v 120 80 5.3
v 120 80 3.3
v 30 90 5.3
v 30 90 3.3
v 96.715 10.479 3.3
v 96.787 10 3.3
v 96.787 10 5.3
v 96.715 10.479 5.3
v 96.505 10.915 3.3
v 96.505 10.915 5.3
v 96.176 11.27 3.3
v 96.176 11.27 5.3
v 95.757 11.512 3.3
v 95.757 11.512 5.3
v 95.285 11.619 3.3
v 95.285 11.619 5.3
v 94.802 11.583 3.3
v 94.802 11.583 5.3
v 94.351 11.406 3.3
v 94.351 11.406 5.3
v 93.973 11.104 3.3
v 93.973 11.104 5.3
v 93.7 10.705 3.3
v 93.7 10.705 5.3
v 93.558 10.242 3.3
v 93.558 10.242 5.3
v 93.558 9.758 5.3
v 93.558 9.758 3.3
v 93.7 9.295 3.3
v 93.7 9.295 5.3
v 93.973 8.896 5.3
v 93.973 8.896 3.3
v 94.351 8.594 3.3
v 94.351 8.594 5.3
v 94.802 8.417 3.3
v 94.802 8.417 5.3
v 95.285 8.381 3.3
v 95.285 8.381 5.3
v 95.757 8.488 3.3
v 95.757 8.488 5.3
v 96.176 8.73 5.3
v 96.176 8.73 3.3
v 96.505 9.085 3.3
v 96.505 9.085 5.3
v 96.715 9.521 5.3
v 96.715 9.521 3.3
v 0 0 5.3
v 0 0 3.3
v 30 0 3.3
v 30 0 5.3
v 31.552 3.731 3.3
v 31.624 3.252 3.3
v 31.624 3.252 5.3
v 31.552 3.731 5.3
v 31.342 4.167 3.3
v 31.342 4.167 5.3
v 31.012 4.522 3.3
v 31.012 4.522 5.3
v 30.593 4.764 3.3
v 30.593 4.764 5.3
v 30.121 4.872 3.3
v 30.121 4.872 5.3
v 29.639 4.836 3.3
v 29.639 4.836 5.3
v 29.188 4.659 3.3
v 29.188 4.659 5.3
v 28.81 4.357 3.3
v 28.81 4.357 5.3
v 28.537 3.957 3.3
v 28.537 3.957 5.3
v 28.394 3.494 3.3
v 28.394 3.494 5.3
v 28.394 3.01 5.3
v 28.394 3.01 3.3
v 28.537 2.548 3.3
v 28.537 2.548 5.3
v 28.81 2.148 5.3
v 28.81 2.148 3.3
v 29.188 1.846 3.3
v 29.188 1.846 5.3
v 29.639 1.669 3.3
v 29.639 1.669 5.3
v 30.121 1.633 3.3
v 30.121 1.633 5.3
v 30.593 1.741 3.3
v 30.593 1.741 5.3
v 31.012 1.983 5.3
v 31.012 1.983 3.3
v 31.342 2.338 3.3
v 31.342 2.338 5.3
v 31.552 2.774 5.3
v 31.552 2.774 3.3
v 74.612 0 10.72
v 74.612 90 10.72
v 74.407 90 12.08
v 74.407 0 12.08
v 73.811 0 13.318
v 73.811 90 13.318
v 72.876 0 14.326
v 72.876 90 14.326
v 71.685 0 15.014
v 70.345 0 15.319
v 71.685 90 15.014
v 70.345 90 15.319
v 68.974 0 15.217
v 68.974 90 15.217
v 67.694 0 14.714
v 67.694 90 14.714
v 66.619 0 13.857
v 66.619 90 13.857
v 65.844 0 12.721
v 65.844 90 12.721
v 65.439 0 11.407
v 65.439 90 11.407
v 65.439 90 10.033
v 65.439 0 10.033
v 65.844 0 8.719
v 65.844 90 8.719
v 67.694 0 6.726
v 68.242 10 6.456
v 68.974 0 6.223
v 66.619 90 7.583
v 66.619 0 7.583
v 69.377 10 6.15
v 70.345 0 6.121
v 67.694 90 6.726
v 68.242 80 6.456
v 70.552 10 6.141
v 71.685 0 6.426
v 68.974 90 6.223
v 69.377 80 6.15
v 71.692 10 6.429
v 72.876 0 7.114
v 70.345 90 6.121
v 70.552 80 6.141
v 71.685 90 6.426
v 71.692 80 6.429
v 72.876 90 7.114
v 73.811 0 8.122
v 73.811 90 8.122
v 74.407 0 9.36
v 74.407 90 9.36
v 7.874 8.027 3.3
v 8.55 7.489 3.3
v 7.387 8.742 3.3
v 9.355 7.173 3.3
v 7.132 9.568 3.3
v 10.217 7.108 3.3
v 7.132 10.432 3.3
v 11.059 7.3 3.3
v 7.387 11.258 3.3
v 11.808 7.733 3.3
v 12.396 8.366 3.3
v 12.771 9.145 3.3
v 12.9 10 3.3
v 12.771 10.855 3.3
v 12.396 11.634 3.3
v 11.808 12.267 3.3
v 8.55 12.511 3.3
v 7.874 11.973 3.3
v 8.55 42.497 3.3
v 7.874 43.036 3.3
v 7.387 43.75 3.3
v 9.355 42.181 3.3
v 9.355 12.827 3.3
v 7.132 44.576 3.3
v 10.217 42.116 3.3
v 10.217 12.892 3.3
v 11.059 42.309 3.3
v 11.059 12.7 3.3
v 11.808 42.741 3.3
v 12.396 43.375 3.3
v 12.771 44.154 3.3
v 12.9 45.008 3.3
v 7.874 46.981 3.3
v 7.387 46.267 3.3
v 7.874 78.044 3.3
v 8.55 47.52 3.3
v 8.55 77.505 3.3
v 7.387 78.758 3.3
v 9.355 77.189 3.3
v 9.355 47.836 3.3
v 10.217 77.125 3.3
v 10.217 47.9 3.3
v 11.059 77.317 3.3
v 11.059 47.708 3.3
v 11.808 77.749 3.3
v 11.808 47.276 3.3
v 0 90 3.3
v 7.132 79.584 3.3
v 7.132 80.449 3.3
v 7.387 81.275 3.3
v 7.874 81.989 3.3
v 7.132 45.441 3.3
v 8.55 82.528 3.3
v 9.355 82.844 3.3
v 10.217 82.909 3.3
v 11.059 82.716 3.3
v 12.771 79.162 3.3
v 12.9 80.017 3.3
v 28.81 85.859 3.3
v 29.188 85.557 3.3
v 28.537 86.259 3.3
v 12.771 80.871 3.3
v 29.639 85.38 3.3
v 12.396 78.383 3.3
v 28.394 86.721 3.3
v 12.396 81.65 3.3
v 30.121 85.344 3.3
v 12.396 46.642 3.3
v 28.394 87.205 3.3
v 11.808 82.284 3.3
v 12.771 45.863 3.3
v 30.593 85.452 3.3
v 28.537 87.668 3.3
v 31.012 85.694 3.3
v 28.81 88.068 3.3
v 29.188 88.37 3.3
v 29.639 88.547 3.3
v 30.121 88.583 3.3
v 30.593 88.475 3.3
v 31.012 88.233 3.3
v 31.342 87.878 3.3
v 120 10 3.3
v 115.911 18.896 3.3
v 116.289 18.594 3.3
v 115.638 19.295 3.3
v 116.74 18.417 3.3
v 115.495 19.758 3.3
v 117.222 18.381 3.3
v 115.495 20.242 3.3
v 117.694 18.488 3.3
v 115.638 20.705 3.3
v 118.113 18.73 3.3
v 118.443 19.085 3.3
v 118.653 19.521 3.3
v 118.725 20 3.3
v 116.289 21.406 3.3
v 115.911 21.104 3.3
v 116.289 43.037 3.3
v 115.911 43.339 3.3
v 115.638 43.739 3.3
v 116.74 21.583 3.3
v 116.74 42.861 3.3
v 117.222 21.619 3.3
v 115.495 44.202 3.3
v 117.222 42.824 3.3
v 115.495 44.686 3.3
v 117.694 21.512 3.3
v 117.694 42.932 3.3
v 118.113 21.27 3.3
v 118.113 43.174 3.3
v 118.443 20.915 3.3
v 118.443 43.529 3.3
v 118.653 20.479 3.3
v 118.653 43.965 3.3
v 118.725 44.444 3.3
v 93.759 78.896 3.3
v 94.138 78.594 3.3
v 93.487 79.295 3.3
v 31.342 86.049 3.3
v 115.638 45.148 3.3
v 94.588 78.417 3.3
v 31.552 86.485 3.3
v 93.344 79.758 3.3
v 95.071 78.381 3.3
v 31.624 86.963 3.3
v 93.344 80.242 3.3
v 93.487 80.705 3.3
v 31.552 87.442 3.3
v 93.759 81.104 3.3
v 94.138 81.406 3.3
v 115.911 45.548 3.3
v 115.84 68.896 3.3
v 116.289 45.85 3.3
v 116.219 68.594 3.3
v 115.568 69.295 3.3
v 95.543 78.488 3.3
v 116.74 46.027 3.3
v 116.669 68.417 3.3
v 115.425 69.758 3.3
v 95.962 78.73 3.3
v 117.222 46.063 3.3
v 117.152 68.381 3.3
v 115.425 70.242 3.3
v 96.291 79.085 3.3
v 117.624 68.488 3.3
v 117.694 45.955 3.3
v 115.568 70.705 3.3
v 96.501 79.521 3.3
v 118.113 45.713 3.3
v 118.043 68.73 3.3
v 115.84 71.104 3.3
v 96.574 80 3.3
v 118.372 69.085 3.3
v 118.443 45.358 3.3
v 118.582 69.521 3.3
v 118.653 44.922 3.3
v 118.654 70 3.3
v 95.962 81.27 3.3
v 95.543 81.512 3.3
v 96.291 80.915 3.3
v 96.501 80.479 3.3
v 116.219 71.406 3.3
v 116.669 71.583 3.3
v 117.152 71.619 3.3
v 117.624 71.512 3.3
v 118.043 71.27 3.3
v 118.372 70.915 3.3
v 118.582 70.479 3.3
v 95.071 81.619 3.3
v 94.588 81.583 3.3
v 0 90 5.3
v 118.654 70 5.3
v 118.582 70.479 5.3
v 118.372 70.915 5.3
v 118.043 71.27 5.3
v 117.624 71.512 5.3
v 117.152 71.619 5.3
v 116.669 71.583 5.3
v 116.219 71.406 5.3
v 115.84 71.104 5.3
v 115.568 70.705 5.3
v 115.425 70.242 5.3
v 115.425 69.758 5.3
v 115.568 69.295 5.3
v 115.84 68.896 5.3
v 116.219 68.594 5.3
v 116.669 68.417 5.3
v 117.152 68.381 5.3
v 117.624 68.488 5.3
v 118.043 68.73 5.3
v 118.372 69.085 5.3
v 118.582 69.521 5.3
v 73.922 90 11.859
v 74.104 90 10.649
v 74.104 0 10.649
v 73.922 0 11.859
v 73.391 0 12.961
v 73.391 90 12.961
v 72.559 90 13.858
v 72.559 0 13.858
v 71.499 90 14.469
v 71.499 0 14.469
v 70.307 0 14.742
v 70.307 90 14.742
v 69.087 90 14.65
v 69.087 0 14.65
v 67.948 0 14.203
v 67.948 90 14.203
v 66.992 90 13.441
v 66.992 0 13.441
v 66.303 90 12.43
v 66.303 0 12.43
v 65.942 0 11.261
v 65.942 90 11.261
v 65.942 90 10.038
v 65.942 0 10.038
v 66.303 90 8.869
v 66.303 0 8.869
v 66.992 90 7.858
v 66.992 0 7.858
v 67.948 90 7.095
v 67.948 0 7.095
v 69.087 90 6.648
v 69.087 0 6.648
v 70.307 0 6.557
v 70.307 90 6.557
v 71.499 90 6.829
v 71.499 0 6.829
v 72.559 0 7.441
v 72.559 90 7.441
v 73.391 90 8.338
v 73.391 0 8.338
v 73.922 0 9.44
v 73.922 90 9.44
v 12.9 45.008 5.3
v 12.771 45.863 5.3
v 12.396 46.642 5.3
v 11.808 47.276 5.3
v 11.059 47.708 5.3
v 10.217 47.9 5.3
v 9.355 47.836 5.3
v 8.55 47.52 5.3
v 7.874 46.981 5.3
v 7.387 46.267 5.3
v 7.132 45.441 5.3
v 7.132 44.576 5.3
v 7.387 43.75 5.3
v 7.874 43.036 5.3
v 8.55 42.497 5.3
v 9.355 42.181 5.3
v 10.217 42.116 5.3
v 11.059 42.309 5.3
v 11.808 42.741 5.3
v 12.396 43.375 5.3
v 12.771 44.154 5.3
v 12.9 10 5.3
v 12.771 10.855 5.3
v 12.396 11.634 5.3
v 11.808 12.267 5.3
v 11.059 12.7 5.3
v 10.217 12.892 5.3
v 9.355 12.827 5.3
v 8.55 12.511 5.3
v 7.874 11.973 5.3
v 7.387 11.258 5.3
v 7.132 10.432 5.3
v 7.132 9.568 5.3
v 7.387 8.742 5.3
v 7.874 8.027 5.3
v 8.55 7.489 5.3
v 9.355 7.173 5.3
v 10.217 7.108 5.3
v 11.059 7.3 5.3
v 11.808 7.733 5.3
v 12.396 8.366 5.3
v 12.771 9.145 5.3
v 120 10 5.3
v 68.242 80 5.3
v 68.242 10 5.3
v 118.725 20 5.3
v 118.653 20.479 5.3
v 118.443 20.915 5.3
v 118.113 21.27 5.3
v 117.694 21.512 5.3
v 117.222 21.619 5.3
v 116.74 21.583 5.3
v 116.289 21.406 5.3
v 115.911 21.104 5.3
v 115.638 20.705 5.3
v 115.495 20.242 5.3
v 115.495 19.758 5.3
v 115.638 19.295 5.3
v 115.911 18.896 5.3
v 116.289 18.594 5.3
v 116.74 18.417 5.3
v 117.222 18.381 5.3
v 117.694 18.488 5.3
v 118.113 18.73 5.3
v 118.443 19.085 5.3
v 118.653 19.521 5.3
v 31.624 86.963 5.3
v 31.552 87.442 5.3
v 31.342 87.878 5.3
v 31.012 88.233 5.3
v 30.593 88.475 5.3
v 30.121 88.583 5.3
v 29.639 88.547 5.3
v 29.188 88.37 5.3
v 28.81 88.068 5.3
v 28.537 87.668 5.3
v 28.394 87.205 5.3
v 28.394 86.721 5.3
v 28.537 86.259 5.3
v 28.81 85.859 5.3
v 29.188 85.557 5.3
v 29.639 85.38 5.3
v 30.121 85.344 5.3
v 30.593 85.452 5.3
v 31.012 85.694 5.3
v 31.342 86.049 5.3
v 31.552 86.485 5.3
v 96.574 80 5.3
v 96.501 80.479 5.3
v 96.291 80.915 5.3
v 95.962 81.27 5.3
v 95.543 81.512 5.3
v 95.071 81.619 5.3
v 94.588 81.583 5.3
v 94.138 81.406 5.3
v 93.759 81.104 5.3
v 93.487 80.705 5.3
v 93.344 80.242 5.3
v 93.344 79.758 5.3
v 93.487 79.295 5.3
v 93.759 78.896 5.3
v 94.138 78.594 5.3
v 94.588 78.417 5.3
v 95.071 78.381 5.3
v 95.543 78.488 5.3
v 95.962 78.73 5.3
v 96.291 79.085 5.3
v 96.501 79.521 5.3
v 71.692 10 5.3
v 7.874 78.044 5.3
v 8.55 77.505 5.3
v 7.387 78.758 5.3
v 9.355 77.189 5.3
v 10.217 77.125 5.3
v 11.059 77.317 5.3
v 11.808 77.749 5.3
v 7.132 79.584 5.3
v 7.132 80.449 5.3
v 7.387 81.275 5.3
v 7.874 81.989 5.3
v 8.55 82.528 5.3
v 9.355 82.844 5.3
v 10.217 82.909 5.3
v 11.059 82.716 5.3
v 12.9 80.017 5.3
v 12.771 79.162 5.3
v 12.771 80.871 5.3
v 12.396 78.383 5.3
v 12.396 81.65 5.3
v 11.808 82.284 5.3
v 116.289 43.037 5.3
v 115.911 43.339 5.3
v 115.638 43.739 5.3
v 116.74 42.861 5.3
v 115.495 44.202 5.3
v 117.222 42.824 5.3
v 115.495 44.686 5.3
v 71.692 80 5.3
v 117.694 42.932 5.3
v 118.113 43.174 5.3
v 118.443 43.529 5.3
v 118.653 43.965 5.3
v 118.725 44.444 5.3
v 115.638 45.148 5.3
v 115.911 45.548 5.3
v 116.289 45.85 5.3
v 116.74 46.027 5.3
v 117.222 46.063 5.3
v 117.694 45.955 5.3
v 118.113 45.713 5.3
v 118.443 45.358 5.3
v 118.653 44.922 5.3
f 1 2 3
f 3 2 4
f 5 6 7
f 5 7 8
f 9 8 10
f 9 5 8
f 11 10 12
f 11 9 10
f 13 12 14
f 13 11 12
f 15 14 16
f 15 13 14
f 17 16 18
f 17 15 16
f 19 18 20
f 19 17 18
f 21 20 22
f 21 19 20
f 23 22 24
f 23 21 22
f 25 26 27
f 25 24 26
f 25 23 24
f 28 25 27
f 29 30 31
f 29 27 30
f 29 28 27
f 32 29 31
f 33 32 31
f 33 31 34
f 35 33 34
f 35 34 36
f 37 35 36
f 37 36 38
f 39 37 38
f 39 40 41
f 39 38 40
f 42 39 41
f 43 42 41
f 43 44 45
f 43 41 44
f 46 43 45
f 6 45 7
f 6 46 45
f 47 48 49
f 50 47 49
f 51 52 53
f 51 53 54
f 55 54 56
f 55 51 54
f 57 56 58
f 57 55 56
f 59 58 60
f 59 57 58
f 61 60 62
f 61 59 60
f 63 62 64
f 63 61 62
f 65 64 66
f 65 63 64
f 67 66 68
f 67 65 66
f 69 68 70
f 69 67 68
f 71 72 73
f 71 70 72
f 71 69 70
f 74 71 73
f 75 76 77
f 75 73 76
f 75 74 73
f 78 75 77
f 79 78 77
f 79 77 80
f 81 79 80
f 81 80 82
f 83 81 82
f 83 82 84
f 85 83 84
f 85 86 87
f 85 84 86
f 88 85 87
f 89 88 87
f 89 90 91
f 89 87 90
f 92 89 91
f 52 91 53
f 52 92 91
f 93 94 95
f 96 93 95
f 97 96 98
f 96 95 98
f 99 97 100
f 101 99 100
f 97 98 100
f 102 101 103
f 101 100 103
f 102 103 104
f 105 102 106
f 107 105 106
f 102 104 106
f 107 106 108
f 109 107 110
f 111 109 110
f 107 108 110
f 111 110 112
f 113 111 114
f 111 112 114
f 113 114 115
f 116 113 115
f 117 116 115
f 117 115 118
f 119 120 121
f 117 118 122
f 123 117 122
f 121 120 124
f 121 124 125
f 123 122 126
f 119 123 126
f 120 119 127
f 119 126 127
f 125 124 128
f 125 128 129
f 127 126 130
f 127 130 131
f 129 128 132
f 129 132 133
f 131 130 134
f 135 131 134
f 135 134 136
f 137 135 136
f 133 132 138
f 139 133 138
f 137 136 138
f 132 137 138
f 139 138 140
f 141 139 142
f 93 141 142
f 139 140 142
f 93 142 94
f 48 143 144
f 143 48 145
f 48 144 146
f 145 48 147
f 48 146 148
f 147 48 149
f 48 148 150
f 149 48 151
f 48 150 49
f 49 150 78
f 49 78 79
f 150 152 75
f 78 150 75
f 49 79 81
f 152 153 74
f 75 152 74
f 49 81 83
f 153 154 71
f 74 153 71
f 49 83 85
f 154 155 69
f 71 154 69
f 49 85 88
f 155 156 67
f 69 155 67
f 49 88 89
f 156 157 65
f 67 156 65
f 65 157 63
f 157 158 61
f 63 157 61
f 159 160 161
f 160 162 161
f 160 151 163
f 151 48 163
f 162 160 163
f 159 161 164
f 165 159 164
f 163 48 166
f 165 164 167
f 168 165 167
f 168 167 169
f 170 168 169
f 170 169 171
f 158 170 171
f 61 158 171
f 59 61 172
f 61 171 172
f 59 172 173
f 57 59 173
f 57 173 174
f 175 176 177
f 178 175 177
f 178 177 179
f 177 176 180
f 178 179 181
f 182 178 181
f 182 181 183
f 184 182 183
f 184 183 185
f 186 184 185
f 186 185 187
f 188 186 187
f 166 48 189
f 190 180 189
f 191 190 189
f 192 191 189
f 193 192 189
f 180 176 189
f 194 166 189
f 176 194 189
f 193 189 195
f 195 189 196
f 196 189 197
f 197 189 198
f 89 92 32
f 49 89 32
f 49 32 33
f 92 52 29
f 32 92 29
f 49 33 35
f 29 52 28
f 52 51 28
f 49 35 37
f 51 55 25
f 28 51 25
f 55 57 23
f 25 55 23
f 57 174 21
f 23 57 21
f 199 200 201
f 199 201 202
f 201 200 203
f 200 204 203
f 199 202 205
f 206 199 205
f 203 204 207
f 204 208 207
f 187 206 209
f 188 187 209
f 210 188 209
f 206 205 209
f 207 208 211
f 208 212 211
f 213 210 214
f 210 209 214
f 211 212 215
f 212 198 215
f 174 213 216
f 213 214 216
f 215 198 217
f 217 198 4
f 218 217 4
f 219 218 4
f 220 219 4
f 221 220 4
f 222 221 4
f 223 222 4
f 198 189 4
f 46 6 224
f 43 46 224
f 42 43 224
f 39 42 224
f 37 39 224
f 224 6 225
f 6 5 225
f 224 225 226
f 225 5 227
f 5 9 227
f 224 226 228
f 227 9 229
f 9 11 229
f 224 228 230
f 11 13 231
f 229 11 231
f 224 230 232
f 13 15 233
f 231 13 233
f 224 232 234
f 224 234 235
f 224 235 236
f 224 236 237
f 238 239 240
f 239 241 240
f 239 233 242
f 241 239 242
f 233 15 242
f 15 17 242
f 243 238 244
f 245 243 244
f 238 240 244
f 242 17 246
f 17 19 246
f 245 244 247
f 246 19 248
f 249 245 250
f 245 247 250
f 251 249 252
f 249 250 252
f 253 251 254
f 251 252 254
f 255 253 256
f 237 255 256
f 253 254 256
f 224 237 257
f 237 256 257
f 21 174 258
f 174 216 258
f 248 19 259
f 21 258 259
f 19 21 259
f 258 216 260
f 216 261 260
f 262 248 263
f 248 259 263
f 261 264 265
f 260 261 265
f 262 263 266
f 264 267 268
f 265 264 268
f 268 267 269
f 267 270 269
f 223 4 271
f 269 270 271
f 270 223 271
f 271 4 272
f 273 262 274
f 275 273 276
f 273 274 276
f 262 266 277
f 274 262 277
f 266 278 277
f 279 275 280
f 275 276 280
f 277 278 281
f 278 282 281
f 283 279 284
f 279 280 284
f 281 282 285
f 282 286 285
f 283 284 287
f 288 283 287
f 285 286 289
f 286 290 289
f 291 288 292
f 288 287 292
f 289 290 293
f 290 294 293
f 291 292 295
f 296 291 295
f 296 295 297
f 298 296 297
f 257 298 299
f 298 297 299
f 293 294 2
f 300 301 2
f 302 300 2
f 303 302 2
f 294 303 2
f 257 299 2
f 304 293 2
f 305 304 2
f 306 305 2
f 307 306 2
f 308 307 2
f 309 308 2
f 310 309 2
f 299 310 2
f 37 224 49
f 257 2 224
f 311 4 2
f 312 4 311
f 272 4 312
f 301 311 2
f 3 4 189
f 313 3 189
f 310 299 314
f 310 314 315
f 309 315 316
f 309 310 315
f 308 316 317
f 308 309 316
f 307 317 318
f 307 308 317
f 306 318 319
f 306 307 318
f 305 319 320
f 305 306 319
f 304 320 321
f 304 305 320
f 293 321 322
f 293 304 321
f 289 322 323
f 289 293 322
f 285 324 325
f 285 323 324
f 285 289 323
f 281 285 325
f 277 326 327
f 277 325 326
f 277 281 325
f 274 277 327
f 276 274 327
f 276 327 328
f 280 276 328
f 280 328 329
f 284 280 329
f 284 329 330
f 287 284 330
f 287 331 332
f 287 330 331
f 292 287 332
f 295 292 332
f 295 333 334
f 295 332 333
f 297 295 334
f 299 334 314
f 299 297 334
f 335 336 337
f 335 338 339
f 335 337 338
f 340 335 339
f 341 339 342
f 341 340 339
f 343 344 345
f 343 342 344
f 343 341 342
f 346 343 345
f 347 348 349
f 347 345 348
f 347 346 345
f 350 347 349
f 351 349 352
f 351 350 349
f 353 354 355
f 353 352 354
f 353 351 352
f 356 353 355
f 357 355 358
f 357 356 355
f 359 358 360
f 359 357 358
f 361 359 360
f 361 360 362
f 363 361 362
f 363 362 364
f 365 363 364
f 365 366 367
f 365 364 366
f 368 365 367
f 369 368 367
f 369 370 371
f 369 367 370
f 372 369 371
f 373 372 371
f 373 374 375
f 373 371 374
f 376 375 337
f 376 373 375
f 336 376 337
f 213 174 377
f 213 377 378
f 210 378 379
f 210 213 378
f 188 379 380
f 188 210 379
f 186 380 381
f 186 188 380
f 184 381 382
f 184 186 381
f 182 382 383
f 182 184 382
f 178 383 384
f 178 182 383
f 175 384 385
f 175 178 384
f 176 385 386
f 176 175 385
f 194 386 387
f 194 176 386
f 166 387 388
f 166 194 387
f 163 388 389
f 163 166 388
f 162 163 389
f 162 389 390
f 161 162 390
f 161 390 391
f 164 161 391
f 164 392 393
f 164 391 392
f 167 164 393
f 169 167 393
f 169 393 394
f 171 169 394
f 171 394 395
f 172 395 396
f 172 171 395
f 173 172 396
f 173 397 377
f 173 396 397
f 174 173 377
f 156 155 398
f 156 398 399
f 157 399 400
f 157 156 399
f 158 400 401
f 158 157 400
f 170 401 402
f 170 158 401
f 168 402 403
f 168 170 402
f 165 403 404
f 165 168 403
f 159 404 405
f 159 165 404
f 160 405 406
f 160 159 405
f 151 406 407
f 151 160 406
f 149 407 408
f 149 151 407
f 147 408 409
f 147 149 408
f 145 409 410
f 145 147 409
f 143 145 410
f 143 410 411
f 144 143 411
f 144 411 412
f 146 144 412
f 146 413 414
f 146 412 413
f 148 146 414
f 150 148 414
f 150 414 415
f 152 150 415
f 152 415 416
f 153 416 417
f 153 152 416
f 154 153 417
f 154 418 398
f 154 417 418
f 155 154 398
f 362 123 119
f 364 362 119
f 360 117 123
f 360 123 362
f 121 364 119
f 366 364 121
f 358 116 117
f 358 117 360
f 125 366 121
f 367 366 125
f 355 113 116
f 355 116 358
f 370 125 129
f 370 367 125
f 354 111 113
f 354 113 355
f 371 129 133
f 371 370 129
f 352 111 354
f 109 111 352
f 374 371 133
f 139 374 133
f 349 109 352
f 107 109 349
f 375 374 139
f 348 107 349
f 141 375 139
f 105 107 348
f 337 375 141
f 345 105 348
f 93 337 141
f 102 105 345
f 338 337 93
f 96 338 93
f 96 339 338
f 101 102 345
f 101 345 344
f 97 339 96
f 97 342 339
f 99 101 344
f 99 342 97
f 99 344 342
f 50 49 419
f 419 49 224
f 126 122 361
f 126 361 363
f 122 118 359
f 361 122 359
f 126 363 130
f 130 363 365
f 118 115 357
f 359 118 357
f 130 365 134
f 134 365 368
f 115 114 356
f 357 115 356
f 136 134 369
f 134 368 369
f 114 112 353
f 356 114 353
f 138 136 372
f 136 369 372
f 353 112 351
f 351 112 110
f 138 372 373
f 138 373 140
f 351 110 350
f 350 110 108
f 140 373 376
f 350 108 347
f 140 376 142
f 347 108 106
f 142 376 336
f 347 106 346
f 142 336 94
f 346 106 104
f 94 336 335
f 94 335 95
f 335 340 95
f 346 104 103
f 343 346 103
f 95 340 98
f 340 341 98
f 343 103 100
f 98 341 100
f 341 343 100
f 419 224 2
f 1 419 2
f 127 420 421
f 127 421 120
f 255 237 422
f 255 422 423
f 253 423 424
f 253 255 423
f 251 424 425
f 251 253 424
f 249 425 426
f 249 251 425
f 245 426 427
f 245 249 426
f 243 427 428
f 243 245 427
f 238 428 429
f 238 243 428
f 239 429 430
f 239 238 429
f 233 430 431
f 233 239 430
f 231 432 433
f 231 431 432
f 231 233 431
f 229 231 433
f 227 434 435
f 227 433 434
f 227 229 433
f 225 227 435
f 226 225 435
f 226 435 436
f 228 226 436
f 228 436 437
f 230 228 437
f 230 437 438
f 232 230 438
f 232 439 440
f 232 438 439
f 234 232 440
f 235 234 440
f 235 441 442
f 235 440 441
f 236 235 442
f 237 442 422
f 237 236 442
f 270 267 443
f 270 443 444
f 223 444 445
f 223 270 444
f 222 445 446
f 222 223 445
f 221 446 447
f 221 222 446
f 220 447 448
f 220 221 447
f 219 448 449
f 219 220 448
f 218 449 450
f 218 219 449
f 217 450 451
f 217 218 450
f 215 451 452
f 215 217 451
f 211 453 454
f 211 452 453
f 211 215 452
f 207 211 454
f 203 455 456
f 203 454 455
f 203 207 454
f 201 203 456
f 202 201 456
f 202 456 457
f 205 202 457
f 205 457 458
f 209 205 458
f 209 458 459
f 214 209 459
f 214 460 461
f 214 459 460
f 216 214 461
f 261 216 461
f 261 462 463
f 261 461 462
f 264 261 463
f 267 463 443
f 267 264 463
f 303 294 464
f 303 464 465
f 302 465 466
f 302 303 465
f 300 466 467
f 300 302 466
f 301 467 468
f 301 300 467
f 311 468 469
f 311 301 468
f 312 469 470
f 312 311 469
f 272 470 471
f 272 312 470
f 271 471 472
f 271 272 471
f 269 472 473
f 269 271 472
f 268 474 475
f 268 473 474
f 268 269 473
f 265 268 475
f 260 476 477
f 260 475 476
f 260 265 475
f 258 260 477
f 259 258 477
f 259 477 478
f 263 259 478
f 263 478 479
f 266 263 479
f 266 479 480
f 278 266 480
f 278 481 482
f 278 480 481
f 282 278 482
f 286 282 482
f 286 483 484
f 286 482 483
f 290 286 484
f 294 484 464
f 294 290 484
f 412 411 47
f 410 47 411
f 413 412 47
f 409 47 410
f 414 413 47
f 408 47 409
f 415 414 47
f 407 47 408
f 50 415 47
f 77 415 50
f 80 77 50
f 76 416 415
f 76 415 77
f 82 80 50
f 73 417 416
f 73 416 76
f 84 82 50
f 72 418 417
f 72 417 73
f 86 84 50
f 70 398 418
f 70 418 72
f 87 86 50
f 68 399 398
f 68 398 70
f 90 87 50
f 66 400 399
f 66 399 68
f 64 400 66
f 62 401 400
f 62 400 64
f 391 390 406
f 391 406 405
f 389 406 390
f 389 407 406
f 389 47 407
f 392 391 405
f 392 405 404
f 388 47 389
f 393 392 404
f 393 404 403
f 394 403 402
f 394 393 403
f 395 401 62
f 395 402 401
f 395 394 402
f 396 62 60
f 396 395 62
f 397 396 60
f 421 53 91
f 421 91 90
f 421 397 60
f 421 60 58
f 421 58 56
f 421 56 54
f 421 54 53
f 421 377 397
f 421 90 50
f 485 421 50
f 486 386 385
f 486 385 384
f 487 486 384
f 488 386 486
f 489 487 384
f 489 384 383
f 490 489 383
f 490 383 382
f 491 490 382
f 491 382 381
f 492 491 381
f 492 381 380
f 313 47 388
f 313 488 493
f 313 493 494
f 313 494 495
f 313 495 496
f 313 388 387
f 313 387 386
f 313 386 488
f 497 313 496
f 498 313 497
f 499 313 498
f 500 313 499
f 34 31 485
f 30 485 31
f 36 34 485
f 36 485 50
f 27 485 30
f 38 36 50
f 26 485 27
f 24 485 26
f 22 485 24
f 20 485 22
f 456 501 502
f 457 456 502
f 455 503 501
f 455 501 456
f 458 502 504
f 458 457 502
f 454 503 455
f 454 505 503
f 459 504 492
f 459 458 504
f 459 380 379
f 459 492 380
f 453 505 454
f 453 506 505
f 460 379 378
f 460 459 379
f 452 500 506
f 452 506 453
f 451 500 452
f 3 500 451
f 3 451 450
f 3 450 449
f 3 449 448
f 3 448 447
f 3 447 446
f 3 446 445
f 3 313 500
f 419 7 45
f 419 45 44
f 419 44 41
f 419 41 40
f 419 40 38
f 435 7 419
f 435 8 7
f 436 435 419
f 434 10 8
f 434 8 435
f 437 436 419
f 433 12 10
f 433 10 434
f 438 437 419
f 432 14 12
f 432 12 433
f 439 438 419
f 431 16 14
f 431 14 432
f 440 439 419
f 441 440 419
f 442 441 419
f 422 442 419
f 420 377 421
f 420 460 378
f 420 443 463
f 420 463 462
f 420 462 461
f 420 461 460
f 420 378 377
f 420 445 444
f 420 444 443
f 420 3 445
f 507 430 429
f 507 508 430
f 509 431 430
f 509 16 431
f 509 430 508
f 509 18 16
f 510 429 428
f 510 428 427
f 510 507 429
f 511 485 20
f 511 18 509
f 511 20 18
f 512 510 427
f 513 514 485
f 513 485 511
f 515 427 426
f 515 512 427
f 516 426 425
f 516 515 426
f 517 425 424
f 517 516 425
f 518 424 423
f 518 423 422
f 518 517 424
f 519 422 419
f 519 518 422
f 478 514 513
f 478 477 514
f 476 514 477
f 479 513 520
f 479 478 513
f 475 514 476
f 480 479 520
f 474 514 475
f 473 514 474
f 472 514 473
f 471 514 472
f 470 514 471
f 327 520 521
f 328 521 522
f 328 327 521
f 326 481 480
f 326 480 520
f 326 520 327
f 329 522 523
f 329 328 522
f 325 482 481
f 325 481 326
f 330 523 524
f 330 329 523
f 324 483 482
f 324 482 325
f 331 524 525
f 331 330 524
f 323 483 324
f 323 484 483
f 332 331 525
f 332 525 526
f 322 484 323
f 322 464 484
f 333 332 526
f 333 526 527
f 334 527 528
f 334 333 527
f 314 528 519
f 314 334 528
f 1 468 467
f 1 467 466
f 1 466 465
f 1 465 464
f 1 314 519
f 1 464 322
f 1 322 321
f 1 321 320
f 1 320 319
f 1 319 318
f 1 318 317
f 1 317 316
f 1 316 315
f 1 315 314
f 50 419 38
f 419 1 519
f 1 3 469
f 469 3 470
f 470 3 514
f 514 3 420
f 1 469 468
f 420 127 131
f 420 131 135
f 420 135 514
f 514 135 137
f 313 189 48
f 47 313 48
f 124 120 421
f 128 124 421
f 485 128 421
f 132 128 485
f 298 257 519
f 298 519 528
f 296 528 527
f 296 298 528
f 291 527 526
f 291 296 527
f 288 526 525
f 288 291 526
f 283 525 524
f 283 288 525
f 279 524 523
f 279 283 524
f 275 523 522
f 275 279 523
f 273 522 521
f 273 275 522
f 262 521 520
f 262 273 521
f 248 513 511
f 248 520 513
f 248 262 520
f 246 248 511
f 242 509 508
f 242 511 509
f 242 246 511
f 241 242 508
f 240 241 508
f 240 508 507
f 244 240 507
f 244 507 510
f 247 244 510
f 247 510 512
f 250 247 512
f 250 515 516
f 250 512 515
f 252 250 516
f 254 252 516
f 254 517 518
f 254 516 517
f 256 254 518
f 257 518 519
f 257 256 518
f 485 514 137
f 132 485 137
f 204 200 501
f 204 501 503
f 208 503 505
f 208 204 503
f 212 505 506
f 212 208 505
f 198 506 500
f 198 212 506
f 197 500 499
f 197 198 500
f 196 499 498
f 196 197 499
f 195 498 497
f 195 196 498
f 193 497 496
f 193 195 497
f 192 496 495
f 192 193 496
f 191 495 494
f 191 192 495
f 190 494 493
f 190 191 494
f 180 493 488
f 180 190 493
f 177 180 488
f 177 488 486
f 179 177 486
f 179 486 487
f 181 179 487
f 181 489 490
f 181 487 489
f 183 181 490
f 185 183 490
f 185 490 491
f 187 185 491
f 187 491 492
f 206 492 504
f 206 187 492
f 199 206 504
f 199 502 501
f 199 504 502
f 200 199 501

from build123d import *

# Parameters (mm, degrees)
SKETCH013_R      = 4.103857
EXTRUDE012_DEPTH = 120
SKETCH012_R      = 4.612338
EXTRUDE011_DEPTH = 90
SKETCH031_W      = 3.449714
SKETCH031_H      = 1.767909
EXTRUDE033_DEPTH = 70
SKETCH174_R      = 1.623797
EXTRUDE193_DEPTH = 10
SKETCH176_R      = 2.9
EXTRUDE005_DEPTH = 50
EXTRUDE002_DEPTH = 2


with BuildPart() as extrude012:
    # Sketch013 → Extrude012 (new body)
    with BuildSketch(Plane.XZ):
        with Locations((70, 3.549289)):
            Circle(SKETCH013_R)
    extrude(amount=EXTRUDE012_DEPTH)


with BuildPart() as extrude012_1:
    # Extrude012 placement: moved
    add(extrude012.part.moved(Location((0, 105, 0))))


with BuildPart() as tubo:
    # Sketch012 → Extrude011 (new body)
    with BuildSketch(Plane.XZ):
        with Locations((70, 3.62)):
            Circle(SKETCH012_R)
    extrude(amount=EXTRUDE011_DEPTH)


with BuildPart() as tubo_1:
    # Extrude011 placement: moved
    add(tubo.part.moved(Location((0, 90, 0))))

    # Cut004: cut Extrude012
    add(extrude012_1.part, mode=Mode.SUBTRACT)


with BuildPart() as fusion066:
    # Sketch031 → Extrude033 (new body)
    with BuildSketch(Plane.XZ):
        with Locations((69.96706, -1.473137)):
            Rectangle(SKETCH031_W, SKETCH031_H)
    extrude(amount=EXTRUDE033_DEPTH)


with BuildPart() as fusion066_1:
    # Extrude033 placement: moved
    add(fusion066.part.moved(Location((0, 80, 0))))

    # Fusion066: union Tubo
    add(tubo_1.part)


with BuildPart() as fusion066_2:
    # Fusion066 placement: moved
    add(fusion066_1.part.moved(Location((0, 0, -8.2))))


with BuildPart() as extrude193:
    # Sketch174 (on Face4 of Cut014) → Extrude193 (new body)
    with BuildSketch(Plane.XY.offset(12.1)):
        with Locations((30, 86.963425)):
            Circle(SKETCH174_R)
        with Locations((30, 3.252438)):
            Circle(SKETCH174_R)
        with Locations((95.163345, 10)):
            Circle(SKETCH174_R)
        with Locations((94.949776, 80)):
            Circle(SKETCH174_R)
        with Locations((117.10096, 20)):
            Circle(SKETCH174_R)
        with Locations((117.030609, 70)):
            Circle(SKETCH174_R)
        with Locations((117.10096, 44.443623)):
            Circle(SKETCH174_R)
    extrude(amount=EXTRUDE193_DEPTH)


with BuildPart() as extrude193_1:
    # Extrude193 placement: moved
    add(extrude193.part.moved(Location((0, 0, -27.7))))


with BuildPart() as tornillos002:
    # Sketch176 (on Face8 of Extrude002) → Extrude005 (new body)
    with BuildSketch(Plane.XY.offset(2)):
        with Locations((10, 80.016689)):
            Circle(SKETCH176_R)
        with Locations((10, 45.008344)):
            Circle(SKETCH176_R)
        with Locations((10, 10)):
            Circle(SKETCH176_R)
    extrude(amount=EXTRUDE005_DEPTH)


with BuildPart() as tornillos002_1:
    # Extrude005 placement: moved
    add(tornillos002.part.moved(Location((0, 0, -21))))


with BuildPart() as base:
    # Sketch175 → Extrude002 (new body)
    with BuildSketch(Plane.XY):
        Polygon((0, 0), (30, 0), (120, 10), (120, 80), (30, 90), (0, 90), align=None)
    extrude(amount=EXTRUDE002_DEPTH)

    # Cut002: cut Tornillos002
    add(tornillos002_1.part, mode=Mode.SUBTRACT)


with BuildPart() as base_1:
    # Cut002 placement: moved
    add(base.part.moved(Location((0, 0, -12))))

    # Cut122: cut Extrude193
    add(extrude193_1.part, mode=Mode.SUBTRACT)

    # Fusion065: union Fusion066
    add(fusion066_2.part)


with BuildPart() as base_2:
    # Fusion065 placement: moved
    add(base_1.part.moved(Location((0, 0, 15.3))))


solid = base_2.part
